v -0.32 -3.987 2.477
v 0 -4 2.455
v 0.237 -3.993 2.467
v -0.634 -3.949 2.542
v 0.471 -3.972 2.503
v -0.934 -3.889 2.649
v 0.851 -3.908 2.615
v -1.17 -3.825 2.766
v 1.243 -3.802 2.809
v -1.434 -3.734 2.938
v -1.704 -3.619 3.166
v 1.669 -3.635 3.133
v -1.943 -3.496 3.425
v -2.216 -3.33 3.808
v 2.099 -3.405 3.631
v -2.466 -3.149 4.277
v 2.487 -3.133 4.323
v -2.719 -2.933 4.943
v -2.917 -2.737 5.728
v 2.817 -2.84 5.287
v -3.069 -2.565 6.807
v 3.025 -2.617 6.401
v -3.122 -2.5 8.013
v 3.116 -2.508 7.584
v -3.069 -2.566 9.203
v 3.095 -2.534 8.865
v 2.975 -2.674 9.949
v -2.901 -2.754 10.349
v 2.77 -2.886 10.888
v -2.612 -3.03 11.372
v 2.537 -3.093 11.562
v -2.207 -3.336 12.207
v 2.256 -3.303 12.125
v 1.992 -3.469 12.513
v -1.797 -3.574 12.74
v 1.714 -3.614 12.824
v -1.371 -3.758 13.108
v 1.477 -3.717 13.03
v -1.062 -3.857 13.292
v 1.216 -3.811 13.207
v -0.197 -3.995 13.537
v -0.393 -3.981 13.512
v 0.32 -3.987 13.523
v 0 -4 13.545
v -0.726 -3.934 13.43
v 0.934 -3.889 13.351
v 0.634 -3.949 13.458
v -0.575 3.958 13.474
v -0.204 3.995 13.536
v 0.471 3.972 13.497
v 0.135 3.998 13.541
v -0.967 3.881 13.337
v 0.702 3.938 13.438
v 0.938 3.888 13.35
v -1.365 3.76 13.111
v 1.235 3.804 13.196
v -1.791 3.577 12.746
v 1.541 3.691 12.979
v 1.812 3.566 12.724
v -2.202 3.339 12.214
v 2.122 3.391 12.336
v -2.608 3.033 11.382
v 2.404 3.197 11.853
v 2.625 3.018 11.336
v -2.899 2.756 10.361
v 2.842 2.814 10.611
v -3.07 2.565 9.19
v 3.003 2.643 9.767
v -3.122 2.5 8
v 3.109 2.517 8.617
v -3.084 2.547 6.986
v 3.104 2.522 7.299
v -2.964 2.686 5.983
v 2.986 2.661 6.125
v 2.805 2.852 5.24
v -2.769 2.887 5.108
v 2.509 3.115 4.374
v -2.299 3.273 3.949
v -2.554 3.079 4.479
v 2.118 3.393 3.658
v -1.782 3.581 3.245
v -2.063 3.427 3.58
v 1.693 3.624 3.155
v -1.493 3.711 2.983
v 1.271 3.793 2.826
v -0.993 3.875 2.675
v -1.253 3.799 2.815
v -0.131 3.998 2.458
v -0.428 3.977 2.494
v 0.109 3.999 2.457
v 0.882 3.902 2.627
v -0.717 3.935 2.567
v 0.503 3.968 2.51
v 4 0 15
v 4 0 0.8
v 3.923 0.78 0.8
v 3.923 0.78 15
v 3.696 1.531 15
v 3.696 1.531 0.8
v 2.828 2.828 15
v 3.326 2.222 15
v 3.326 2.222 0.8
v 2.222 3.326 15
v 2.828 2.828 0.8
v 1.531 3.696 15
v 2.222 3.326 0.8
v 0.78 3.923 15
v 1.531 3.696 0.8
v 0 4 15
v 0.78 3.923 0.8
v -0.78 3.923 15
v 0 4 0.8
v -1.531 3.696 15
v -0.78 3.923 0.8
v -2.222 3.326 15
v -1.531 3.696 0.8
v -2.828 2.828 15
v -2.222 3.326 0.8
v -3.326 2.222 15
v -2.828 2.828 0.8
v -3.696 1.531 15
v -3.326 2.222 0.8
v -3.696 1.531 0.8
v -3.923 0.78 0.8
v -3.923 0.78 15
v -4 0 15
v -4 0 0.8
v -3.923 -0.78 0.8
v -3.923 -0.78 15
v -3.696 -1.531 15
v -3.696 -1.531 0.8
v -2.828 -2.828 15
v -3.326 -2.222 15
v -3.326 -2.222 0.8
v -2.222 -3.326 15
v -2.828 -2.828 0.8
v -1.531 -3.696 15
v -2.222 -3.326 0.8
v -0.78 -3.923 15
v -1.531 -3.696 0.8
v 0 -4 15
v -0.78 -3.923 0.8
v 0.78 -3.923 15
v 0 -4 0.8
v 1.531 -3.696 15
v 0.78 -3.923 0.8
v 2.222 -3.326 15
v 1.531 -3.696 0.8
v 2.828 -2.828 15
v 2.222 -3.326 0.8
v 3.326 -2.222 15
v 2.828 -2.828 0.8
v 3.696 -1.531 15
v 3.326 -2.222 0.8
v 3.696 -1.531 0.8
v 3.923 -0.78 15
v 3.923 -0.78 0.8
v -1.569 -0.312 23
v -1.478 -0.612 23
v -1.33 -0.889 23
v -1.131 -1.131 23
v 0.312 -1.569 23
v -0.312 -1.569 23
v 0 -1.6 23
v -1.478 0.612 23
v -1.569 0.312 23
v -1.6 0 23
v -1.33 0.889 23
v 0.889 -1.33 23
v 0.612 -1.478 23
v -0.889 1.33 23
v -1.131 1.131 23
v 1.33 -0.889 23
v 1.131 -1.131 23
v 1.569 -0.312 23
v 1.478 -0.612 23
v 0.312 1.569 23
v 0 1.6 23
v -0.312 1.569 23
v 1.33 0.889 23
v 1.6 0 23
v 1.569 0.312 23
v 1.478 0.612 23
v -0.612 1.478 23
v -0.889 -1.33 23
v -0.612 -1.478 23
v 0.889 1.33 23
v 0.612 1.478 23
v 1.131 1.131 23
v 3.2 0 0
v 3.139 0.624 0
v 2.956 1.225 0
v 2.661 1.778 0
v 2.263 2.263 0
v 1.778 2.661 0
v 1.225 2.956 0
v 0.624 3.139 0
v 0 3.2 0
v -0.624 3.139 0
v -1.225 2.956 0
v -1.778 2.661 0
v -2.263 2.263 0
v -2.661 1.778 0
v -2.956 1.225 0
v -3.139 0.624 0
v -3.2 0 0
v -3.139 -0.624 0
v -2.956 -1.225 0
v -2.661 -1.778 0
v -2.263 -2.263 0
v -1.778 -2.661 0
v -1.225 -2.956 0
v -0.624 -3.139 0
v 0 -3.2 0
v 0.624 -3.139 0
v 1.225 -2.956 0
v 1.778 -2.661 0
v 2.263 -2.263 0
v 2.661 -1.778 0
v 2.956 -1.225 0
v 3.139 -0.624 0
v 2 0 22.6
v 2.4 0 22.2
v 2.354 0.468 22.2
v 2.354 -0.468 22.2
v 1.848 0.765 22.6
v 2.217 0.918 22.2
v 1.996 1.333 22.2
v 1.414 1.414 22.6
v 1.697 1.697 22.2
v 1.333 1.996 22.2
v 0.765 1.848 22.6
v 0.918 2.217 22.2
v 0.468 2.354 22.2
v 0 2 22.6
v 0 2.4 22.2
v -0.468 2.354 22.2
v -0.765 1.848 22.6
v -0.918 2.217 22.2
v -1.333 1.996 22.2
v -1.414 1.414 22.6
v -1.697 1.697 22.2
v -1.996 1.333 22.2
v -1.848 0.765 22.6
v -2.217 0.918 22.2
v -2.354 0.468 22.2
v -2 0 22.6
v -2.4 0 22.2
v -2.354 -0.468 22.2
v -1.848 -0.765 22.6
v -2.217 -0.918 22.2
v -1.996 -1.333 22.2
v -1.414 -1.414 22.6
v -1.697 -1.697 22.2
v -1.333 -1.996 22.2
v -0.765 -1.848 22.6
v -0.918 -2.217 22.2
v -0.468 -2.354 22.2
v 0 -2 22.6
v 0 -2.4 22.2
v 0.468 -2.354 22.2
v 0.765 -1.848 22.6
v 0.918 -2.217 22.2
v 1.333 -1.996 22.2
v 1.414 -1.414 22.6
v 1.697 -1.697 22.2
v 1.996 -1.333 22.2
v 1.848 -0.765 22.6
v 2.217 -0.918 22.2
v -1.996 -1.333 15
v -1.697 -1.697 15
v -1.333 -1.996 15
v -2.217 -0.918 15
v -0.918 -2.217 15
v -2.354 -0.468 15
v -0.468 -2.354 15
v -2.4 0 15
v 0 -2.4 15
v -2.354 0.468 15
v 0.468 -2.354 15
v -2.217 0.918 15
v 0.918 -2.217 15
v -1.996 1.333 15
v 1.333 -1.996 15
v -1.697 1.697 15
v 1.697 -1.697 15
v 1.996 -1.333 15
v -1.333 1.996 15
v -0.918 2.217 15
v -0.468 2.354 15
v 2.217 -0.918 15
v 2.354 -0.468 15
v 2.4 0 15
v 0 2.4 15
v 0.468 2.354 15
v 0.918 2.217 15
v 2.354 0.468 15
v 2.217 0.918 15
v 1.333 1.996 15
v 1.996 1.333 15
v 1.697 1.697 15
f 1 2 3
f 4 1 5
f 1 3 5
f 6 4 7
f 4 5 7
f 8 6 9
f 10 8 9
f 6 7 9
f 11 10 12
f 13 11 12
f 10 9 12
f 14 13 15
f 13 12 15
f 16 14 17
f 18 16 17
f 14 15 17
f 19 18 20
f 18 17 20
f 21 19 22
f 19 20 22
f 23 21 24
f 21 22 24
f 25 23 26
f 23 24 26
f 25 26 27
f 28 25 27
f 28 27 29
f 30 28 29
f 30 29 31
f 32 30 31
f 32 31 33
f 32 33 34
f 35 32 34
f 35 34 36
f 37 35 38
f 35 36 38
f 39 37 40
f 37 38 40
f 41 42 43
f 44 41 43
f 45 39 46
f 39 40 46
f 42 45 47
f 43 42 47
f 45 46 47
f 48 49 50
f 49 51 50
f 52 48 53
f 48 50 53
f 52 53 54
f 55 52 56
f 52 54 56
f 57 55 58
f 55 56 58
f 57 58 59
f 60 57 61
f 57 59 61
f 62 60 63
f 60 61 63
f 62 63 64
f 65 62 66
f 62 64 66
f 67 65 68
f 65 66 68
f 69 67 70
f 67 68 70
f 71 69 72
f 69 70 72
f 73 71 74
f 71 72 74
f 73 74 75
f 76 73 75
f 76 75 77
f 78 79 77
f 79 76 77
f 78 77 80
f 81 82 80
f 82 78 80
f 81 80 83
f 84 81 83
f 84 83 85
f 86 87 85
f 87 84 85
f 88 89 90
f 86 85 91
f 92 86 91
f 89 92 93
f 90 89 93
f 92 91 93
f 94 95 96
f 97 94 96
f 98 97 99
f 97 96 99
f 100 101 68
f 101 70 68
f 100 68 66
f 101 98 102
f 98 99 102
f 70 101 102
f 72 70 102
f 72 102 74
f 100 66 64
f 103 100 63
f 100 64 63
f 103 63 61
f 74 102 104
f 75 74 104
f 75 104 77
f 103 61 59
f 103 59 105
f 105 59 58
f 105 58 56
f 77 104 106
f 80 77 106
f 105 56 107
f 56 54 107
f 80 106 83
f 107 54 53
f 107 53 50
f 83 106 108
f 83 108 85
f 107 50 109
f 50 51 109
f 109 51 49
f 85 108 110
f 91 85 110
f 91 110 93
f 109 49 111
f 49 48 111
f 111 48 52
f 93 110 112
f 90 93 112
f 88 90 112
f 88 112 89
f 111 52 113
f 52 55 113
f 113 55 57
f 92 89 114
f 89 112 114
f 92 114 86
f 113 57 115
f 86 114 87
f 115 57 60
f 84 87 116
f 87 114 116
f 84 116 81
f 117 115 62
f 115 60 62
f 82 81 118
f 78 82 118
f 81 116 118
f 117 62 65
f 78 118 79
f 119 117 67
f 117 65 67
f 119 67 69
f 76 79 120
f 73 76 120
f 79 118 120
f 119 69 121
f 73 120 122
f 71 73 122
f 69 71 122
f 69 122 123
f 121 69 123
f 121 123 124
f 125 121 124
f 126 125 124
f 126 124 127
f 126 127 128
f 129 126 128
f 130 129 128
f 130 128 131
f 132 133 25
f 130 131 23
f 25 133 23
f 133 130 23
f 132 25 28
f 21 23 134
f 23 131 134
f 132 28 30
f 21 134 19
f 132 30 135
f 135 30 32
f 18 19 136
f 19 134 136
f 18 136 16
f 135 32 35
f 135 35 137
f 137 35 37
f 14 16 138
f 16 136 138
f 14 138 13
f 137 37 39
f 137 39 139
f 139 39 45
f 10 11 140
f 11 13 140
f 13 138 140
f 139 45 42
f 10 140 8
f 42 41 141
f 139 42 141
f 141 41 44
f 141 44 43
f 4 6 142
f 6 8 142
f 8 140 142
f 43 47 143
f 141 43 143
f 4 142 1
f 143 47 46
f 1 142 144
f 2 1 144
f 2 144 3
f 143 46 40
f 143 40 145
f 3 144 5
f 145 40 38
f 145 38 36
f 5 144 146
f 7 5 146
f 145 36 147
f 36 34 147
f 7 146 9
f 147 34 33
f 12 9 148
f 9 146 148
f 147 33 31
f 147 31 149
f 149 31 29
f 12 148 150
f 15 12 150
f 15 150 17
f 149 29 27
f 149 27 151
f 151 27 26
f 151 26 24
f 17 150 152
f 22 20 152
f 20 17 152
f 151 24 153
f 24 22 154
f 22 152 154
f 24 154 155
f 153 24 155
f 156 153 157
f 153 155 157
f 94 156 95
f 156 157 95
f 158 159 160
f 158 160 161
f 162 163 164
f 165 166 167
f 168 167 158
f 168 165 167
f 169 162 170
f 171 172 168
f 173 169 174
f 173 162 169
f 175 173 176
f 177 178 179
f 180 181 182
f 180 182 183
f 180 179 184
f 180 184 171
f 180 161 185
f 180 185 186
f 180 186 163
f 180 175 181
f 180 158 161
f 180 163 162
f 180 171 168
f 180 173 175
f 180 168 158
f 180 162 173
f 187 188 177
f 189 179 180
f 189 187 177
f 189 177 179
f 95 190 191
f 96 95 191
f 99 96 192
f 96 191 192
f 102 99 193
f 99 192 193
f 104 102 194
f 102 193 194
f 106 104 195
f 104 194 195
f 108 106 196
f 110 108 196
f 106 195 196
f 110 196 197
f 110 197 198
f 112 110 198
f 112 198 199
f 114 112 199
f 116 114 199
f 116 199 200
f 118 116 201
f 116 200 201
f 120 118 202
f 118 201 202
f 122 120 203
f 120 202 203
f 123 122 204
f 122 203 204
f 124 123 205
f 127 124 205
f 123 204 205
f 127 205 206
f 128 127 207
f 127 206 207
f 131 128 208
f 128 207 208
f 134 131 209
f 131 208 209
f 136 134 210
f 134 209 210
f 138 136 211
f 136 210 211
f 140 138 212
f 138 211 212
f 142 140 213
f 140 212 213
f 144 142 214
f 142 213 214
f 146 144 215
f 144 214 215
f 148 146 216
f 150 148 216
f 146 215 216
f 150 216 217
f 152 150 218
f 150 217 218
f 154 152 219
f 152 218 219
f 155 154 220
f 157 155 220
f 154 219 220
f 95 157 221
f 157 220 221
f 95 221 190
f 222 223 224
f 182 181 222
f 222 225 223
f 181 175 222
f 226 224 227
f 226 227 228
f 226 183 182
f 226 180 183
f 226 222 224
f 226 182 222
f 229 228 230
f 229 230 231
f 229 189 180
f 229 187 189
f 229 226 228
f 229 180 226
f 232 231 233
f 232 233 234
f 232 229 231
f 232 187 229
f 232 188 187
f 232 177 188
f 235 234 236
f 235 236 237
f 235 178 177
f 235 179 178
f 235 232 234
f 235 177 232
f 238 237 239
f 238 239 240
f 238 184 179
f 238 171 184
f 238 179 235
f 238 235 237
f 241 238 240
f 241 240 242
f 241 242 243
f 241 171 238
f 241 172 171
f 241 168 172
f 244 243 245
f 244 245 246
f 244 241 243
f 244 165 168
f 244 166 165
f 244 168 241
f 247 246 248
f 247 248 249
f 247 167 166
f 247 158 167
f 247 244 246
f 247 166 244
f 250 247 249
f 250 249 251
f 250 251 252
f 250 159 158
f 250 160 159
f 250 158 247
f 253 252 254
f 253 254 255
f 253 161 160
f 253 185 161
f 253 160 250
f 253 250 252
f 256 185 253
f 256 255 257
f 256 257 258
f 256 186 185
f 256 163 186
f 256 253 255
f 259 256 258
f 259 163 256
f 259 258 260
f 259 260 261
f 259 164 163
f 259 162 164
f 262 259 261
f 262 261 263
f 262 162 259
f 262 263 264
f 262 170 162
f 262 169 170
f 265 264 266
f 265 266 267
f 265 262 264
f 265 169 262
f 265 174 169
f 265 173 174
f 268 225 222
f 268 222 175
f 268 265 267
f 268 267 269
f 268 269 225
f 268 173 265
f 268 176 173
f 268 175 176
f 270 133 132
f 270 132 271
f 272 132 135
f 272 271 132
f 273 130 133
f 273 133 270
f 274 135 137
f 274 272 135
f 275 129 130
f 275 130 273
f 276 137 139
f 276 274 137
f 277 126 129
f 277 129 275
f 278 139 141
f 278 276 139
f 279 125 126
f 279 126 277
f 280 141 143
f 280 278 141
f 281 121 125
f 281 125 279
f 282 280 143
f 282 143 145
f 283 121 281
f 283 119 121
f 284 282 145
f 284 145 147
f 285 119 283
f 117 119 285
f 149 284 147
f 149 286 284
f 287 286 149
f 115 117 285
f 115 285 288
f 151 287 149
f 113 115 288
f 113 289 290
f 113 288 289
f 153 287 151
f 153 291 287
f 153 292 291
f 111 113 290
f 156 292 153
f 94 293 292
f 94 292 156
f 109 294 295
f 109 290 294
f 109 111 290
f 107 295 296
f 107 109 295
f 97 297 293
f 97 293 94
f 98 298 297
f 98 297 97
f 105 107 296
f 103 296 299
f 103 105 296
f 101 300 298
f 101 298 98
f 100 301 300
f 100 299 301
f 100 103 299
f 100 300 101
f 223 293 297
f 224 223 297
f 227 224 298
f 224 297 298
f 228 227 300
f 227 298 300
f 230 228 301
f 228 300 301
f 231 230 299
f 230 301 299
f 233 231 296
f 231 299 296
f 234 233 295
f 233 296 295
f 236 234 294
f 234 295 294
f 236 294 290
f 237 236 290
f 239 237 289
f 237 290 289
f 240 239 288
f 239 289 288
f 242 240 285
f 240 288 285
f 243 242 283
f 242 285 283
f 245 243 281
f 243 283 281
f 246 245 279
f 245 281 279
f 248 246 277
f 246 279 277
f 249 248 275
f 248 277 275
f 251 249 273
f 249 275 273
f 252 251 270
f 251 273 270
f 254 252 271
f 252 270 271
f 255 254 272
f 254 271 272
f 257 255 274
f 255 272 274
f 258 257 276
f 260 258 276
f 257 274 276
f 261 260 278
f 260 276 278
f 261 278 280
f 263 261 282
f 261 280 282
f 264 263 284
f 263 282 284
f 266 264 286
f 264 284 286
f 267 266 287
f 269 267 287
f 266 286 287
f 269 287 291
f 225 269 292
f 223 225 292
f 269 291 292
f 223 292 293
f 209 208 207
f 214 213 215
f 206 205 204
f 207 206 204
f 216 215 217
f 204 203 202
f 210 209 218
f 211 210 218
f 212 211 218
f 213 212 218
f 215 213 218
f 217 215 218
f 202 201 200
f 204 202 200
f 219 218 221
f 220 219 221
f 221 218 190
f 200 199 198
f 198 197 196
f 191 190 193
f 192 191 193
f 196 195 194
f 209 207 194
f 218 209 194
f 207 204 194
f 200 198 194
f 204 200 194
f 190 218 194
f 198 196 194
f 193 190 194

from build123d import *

# Parameters (mm, degrees)
F0_R     = 4
F1_DEPTH = 15
F2_R     = 2.4
F3_DEPTH = 8
F4_SIZE  = 0.8
F5_R     = 11
F6_DEPTH = 5


with BuildPart() as f1:
    # F0 (on Top) → F1 (new body)
    with BuildSketch(Plane.XY):
        Circle(F0_R)
    extrude(amount=F1_DEPTH)

    # F2 (on face) → F3 (join)
    with BuildSketch(Plane.XY.offset(15)):
        Circle(F2_R)
    extrude(amount=F3_DEPTH)

    # F4
    f4_edges = [f1.edges().sort_by_distance(p)[0] for p in [
        (-2.4, 0, 23),
        (-4, 0, 0),
    ]]
    chamfer(f4_edges, length=F4_SIZE)

    # F5 (on Right) → F6 (cut, symmetric)
    with BuildSketch(Plane.YZ):
        with Locations((-13.5, 8)):
            Circle(F5_R)
        with Locations((13.5, 8)):
            Circle(F5_R)
    extrude(amount=F6_DEPTH, both=True, mode=Mode.SUBTRACT)


solid = f1.part
